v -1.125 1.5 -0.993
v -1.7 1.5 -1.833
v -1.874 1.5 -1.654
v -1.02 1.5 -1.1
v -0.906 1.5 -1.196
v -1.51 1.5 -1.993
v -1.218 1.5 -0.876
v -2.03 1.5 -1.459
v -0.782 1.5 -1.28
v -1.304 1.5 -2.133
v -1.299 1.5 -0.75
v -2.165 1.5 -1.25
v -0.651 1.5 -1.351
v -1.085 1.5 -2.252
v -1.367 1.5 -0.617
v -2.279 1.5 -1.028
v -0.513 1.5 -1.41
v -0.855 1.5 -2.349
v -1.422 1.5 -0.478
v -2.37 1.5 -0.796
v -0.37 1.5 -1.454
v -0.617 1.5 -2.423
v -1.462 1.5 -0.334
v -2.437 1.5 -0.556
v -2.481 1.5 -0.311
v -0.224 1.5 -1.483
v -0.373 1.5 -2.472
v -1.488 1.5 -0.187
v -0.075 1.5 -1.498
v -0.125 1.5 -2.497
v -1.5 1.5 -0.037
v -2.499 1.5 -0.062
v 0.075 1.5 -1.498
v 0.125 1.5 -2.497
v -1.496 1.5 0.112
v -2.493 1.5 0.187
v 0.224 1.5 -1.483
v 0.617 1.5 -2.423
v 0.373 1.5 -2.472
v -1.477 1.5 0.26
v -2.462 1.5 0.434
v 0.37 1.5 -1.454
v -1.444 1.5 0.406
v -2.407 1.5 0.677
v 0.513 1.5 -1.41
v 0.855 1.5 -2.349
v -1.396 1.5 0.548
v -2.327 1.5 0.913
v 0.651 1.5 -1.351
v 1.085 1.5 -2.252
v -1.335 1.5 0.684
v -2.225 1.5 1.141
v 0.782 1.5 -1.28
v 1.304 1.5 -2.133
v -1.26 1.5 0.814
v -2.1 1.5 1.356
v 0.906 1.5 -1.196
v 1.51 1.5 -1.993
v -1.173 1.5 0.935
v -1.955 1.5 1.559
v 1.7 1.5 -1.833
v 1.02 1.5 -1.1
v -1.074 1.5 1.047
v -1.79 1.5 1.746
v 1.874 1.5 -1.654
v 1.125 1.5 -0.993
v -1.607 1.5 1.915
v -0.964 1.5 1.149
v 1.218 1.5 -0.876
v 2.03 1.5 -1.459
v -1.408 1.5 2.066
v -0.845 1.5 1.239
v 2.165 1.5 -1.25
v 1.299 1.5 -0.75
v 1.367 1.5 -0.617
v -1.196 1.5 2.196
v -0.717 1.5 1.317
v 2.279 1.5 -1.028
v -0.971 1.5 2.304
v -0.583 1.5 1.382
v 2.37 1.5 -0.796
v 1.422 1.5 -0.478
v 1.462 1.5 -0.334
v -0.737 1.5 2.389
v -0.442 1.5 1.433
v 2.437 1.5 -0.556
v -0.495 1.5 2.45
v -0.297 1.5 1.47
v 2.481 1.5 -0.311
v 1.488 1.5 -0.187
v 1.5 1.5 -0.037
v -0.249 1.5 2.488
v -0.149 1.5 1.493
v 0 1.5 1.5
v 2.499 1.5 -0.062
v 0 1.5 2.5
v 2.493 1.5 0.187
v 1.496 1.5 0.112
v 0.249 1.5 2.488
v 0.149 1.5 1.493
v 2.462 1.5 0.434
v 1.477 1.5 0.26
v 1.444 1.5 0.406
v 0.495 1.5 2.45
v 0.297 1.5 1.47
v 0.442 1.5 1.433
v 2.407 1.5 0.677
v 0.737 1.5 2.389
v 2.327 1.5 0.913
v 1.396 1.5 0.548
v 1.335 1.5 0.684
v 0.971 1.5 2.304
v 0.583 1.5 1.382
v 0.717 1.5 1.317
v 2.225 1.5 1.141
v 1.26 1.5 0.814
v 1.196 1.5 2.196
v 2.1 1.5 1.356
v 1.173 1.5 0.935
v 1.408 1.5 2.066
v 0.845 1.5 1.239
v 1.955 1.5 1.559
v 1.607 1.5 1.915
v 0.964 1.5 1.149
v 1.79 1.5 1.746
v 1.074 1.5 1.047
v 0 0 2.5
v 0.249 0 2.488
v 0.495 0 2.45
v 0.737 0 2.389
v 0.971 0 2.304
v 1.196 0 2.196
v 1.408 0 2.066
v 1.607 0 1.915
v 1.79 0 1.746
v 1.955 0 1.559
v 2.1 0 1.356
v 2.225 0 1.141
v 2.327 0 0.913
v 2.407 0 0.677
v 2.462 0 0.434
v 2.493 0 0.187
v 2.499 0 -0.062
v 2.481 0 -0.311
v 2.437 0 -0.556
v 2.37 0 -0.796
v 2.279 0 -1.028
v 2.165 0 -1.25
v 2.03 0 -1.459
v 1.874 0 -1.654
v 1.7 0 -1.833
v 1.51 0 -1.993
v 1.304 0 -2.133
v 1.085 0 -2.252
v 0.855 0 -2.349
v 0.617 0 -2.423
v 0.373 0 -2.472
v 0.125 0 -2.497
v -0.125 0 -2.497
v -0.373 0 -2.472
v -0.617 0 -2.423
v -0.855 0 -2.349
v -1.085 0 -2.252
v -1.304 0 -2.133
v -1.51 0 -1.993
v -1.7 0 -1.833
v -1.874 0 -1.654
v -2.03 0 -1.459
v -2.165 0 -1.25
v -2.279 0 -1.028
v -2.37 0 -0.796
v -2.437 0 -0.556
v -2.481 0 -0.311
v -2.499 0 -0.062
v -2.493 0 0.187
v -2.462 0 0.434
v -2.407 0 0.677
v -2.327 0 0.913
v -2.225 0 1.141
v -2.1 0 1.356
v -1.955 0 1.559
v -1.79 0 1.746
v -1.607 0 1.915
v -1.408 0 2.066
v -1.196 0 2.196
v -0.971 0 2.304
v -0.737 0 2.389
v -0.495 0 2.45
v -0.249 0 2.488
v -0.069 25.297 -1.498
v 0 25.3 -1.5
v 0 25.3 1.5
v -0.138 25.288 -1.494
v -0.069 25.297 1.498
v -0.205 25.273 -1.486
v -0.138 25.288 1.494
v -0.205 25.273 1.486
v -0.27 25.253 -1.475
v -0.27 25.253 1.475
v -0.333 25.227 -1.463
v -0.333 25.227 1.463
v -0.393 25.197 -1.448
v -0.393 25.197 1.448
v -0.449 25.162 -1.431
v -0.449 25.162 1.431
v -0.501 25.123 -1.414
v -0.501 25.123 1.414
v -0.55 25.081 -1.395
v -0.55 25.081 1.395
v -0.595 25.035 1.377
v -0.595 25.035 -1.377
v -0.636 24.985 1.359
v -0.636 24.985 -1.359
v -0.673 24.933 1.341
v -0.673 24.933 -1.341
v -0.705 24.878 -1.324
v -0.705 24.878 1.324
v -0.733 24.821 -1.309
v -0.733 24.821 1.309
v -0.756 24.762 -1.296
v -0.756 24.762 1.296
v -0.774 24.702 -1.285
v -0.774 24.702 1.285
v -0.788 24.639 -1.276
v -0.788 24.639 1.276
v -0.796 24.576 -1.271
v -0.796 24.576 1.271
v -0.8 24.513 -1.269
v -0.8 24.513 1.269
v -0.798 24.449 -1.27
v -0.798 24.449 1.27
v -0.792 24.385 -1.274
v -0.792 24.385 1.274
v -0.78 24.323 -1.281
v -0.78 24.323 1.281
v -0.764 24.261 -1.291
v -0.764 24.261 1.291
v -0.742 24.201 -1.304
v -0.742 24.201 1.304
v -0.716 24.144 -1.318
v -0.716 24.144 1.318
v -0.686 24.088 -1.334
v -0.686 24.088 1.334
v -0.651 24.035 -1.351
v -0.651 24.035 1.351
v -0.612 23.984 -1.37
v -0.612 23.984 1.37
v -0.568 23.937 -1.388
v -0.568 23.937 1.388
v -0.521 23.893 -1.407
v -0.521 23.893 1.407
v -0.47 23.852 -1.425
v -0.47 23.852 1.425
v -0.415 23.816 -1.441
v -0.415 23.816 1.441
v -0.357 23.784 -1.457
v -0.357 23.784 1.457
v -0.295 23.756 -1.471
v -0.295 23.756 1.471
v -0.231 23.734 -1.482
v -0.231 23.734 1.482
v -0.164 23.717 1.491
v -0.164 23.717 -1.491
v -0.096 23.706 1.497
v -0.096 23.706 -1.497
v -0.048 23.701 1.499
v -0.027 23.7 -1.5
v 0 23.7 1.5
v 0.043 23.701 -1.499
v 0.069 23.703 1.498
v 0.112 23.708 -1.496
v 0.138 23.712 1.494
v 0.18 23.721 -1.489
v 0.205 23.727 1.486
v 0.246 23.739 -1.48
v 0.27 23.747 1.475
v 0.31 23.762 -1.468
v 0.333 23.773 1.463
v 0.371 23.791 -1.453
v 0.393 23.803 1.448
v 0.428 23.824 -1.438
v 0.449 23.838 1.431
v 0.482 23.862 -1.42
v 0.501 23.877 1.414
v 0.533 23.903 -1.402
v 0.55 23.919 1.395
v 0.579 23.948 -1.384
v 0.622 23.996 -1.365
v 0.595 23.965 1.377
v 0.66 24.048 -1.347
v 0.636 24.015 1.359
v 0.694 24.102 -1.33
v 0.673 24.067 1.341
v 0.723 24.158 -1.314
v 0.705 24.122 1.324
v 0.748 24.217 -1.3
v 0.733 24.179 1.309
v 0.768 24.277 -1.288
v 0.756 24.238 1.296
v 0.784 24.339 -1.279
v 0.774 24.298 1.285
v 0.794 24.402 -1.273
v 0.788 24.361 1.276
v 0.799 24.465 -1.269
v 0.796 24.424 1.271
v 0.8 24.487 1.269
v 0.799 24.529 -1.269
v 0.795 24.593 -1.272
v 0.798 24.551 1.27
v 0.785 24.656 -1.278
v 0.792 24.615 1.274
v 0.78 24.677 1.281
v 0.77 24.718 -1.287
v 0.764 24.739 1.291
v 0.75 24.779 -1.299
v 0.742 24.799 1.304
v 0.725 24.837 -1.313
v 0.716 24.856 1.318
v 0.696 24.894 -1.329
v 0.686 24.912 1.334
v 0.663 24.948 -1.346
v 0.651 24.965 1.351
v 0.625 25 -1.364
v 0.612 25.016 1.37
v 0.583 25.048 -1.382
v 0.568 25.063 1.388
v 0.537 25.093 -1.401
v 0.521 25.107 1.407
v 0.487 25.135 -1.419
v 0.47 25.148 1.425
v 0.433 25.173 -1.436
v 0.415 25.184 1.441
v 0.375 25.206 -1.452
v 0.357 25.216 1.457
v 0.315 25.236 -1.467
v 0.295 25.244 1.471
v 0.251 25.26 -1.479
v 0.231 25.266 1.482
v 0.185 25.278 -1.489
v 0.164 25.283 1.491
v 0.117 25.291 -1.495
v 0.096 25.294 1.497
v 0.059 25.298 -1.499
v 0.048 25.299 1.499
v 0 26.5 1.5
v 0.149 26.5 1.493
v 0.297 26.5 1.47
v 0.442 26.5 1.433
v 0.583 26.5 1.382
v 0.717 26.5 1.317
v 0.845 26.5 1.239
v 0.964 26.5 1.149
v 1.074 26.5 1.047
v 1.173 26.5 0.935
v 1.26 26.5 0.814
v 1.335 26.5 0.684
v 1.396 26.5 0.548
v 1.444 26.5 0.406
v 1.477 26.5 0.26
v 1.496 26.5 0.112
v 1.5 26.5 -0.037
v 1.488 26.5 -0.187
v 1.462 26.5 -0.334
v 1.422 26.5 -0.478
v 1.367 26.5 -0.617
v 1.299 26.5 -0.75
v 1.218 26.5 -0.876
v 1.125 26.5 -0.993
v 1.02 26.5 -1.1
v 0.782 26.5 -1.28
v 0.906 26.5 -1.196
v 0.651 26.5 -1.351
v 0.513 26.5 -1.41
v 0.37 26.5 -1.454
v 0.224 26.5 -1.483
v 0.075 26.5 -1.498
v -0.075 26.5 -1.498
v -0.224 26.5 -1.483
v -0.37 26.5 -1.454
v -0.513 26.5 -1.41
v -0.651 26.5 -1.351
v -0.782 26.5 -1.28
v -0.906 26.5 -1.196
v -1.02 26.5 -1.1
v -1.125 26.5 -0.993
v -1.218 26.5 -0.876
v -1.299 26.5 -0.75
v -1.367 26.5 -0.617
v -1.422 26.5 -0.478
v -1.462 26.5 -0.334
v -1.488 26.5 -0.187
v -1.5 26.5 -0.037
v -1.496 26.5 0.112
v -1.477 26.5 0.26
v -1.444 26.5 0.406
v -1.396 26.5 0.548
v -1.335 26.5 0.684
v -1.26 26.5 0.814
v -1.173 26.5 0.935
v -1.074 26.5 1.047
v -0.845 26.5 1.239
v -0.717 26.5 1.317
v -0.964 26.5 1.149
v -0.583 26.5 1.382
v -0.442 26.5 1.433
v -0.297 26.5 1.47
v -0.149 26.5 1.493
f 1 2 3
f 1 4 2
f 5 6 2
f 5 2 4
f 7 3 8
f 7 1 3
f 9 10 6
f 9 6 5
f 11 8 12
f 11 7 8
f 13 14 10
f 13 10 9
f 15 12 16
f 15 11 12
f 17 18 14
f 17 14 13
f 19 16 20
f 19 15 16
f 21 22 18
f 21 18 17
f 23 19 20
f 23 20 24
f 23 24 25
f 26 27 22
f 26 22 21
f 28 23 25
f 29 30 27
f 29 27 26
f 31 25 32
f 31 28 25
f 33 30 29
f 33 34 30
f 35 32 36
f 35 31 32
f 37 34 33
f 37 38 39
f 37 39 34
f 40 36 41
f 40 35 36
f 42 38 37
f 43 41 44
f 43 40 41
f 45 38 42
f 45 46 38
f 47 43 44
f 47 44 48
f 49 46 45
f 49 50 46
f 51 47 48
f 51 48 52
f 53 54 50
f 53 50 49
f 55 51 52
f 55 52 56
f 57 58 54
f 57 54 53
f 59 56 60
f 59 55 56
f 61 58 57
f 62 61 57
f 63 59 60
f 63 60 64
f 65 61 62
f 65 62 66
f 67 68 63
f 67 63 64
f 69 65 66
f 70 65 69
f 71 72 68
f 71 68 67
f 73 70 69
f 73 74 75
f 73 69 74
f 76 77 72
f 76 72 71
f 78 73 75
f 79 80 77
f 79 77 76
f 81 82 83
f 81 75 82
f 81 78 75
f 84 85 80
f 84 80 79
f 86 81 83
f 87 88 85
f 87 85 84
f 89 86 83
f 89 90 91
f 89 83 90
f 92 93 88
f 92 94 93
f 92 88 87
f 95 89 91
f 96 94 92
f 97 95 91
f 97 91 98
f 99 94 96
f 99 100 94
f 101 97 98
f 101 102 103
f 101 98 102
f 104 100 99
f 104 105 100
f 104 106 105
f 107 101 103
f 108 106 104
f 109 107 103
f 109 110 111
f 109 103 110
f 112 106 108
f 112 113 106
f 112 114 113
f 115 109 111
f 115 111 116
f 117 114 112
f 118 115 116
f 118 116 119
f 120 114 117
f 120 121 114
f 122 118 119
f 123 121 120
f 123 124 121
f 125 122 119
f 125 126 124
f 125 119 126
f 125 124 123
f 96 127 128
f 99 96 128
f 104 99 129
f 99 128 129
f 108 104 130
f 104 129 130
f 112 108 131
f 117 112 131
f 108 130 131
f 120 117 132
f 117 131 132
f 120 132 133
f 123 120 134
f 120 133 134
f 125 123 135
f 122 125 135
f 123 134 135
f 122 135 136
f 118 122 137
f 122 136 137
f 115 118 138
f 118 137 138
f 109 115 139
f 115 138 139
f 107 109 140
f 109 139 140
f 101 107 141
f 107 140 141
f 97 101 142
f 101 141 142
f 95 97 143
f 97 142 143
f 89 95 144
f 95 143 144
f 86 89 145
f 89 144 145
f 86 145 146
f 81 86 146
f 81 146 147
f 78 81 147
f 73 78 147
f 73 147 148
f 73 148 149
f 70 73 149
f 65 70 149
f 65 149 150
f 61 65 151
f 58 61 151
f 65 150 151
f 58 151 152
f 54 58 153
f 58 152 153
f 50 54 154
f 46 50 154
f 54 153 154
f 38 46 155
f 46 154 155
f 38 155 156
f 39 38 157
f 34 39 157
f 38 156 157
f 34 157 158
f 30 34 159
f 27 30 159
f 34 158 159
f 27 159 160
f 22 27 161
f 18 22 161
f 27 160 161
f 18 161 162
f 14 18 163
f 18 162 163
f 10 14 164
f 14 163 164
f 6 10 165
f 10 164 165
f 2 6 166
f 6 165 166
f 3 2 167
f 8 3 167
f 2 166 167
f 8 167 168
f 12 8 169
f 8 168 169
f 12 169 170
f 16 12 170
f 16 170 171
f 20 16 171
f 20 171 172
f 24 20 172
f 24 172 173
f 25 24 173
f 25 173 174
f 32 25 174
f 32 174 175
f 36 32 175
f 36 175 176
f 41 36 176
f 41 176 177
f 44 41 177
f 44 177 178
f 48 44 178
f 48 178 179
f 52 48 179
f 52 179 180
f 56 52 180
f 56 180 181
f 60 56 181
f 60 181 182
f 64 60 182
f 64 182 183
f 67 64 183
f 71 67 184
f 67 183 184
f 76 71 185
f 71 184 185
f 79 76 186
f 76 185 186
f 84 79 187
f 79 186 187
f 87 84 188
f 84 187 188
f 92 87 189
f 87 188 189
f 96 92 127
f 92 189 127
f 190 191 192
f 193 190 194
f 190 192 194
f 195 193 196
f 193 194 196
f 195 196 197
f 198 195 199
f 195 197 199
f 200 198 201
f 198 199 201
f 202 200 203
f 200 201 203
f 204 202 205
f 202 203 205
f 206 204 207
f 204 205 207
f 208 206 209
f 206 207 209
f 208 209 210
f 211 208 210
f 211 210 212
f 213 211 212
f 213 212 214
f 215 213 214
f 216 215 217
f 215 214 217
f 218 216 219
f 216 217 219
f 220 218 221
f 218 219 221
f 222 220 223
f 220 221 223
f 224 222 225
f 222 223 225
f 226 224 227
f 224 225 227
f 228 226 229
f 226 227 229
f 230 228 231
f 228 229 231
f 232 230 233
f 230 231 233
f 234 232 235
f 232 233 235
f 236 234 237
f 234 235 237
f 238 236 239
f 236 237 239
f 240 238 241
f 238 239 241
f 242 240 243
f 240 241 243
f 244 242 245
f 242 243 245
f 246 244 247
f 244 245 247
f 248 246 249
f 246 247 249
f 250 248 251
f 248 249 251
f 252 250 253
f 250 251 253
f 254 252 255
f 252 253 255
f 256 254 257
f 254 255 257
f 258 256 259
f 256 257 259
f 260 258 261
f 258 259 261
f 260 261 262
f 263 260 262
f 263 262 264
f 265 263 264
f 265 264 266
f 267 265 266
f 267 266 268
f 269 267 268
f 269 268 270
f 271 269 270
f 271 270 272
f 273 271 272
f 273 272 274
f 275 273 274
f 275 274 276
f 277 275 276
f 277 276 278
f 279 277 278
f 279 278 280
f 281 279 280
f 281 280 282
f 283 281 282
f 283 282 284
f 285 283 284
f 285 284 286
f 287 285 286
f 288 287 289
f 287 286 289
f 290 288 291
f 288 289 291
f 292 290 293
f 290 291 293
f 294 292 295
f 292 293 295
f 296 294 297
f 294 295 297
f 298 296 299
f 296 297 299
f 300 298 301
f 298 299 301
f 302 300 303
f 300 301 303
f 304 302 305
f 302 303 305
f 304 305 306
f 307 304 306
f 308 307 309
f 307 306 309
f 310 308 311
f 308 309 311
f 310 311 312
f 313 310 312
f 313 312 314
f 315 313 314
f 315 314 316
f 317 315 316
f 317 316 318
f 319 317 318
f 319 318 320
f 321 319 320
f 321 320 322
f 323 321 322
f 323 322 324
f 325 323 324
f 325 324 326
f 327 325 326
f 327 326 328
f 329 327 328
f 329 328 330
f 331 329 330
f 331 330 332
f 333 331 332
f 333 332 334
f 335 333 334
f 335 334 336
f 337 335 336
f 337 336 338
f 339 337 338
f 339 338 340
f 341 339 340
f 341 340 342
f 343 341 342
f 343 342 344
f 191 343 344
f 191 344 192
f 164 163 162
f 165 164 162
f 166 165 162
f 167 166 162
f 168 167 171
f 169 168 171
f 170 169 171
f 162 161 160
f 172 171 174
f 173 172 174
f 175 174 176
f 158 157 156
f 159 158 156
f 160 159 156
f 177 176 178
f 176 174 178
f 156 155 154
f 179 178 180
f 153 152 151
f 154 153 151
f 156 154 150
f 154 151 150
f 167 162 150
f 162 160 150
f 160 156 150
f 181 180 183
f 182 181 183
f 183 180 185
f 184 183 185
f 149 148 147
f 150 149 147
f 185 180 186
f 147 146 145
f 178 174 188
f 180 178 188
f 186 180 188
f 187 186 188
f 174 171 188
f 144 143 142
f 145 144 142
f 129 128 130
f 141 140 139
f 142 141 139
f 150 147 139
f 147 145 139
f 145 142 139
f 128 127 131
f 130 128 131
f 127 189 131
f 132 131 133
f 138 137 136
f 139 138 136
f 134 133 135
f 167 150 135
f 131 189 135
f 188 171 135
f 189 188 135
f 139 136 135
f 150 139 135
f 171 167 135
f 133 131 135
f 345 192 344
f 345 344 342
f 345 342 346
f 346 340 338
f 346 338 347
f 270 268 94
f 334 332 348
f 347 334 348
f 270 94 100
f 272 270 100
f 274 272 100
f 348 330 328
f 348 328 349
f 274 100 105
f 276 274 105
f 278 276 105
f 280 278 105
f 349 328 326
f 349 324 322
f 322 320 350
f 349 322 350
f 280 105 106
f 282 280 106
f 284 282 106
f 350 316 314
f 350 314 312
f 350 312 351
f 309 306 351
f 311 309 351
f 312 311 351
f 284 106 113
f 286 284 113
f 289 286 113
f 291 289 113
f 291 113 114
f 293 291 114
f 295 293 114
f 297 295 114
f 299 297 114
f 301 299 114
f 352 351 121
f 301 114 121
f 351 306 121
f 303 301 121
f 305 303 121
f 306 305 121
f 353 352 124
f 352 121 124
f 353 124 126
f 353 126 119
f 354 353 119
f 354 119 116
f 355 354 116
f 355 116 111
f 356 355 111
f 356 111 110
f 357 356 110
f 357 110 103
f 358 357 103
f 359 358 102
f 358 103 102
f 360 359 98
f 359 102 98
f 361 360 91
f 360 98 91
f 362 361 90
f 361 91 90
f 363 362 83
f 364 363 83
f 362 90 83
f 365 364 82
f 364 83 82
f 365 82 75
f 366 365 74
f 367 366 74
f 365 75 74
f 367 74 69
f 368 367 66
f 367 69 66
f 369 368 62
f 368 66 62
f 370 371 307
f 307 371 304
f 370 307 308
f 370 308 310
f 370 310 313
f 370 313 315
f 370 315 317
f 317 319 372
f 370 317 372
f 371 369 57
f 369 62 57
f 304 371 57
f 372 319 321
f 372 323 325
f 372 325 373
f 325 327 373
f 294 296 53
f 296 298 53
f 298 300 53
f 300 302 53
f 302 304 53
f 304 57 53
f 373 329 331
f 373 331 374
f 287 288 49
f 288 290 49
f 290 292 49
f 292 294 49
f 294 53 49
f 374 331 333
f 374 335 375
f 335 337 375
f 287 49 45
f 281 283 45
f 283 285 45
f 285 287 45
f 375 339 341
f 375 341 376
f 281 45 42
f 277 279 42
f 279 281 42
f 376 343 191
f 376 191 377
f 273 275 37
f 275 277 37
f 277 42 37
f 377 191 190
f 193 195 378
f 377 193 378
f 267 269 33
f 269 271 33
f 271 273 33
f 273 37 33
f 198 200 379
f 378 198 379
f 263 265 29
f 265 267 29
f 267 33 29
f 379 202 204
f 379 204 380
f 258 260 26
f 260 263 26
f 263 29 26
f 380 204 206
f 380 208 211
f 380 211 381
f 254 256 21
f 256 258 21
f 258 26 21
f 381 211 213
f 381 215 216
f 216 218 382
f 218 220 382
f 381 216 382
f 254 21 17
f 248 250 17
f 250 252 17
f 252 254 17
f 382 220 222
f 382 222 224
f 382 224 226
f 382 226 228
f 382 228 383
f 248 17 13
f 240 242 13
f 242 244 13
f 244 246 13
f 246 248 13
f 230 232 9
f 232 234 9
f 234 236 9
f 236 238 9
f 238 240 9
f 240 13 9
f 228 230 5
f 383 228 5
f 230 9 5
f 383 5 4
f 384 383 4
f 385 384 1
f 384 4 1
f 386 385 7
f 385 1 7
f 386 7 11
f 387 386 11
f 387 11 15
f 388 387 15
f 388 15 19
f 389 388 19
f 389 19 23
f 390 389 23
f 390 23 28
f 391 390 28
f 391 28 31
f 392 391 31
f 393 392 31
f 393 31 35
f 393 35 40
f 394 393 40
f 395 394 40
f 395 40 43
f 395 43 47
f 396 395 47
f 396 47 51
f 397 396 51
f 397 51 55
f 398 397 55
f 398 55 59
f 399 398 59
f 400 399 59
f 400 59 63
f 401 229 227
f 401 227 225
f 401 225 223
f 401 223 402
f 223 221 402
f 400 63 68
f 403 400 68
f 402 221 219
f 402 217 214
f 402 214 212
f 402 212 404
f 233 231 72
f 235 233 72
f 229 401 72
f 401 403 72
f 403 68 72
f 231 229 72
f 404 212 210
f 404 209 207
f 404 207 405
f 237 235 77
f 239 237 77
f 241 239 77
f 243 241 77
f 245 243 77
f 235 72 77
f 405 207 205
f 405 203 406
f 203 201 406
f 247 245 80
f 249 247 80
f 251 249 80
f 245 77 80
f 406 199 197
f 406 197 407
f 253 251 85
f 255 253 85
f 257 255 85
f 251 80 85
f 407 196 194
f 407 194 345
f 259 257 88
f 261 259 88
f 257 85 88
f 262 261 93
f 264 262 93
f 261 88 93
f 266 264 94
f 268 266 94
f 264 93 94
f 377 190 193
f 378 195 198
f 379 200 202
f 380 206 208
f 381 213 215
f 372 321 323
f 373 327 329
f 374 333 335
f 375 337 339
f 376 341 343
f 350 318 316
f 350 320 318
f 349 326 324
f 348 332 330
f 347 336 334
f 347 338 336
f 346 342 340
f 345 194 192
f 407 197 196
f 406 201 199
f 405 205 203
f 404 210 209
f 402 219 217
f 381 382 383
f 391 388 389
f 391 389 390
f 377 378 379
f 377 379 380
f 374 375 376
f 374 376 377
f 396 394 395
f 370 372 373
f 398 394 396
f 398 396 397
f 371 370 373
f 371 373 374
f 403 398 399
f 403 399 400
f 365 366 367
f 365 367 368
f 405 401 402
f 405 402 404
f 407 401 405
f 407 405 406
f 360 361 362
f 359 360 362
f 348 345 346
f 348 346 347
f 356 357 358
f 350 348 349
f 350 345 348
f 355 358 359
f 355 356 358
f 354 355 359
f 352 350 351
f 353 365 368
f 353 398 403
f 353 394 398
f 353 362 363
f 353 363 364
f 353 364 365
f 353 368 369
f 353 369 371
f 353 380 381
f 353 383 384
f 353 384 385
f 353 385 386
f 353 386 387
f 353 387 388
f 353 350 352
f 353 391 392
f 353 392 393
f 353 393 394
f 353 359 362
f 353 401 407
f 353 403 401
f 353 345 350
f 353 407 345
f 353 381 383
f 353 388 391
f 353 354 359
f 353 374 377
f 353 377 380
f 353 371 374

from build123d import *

# Parameters (mm, degrees)
SKETCH_1_R          = 2.5
EXTRUDE_1_DEPTH     = 1.5
SKETCH_2_R          = 1.5
EXTRUDE_2_DEPTH     = 25
SKETCH_3_R          = 0.8
CUT_EXTRUDE_1_DEPTH = 5


with BuildPart() as part:
    # 草图1 → 凸台-拉伸1 (new body)
    with BuildSketch(Plane(origin=(0, 0, 0), x_dir=(1, 0, 0), z_dir=(0, 1, 0))):
        with Locations(Location((0, 0, 0), (0, 0, 270))):
            Circle(SKETCH_1_R)
    extrude(amount=EXTRUDE_1_DEPTH)

    # 草图2 → 凸台-拉伸2 (add)
    with BuildSketch(Plane(origin=(0, 1.5, 0), x_dir=(1, 0, 0), z_dir=(0, 1, 0))):
        with Locations(Location((0, 0, 0), (0, 0, 270))):
            Circle(SKETCH_2_R)
    extrude(amount=EXTRUDE_2_DEPTH)

    # 草图3 → 切除-拉伸1 (cut, symmetric)
    with BuildSketch(Plane.XY):
        with Locations(Location((0, 24.5, 0), (0, 0, 89.999999995))):
            Circle(SKETCH_3_R)
    extrude(amount=CUT_EXTRUDE_1_DEPTH, both=True, mode=Mode.SUBTRACT)


solid = part.part
